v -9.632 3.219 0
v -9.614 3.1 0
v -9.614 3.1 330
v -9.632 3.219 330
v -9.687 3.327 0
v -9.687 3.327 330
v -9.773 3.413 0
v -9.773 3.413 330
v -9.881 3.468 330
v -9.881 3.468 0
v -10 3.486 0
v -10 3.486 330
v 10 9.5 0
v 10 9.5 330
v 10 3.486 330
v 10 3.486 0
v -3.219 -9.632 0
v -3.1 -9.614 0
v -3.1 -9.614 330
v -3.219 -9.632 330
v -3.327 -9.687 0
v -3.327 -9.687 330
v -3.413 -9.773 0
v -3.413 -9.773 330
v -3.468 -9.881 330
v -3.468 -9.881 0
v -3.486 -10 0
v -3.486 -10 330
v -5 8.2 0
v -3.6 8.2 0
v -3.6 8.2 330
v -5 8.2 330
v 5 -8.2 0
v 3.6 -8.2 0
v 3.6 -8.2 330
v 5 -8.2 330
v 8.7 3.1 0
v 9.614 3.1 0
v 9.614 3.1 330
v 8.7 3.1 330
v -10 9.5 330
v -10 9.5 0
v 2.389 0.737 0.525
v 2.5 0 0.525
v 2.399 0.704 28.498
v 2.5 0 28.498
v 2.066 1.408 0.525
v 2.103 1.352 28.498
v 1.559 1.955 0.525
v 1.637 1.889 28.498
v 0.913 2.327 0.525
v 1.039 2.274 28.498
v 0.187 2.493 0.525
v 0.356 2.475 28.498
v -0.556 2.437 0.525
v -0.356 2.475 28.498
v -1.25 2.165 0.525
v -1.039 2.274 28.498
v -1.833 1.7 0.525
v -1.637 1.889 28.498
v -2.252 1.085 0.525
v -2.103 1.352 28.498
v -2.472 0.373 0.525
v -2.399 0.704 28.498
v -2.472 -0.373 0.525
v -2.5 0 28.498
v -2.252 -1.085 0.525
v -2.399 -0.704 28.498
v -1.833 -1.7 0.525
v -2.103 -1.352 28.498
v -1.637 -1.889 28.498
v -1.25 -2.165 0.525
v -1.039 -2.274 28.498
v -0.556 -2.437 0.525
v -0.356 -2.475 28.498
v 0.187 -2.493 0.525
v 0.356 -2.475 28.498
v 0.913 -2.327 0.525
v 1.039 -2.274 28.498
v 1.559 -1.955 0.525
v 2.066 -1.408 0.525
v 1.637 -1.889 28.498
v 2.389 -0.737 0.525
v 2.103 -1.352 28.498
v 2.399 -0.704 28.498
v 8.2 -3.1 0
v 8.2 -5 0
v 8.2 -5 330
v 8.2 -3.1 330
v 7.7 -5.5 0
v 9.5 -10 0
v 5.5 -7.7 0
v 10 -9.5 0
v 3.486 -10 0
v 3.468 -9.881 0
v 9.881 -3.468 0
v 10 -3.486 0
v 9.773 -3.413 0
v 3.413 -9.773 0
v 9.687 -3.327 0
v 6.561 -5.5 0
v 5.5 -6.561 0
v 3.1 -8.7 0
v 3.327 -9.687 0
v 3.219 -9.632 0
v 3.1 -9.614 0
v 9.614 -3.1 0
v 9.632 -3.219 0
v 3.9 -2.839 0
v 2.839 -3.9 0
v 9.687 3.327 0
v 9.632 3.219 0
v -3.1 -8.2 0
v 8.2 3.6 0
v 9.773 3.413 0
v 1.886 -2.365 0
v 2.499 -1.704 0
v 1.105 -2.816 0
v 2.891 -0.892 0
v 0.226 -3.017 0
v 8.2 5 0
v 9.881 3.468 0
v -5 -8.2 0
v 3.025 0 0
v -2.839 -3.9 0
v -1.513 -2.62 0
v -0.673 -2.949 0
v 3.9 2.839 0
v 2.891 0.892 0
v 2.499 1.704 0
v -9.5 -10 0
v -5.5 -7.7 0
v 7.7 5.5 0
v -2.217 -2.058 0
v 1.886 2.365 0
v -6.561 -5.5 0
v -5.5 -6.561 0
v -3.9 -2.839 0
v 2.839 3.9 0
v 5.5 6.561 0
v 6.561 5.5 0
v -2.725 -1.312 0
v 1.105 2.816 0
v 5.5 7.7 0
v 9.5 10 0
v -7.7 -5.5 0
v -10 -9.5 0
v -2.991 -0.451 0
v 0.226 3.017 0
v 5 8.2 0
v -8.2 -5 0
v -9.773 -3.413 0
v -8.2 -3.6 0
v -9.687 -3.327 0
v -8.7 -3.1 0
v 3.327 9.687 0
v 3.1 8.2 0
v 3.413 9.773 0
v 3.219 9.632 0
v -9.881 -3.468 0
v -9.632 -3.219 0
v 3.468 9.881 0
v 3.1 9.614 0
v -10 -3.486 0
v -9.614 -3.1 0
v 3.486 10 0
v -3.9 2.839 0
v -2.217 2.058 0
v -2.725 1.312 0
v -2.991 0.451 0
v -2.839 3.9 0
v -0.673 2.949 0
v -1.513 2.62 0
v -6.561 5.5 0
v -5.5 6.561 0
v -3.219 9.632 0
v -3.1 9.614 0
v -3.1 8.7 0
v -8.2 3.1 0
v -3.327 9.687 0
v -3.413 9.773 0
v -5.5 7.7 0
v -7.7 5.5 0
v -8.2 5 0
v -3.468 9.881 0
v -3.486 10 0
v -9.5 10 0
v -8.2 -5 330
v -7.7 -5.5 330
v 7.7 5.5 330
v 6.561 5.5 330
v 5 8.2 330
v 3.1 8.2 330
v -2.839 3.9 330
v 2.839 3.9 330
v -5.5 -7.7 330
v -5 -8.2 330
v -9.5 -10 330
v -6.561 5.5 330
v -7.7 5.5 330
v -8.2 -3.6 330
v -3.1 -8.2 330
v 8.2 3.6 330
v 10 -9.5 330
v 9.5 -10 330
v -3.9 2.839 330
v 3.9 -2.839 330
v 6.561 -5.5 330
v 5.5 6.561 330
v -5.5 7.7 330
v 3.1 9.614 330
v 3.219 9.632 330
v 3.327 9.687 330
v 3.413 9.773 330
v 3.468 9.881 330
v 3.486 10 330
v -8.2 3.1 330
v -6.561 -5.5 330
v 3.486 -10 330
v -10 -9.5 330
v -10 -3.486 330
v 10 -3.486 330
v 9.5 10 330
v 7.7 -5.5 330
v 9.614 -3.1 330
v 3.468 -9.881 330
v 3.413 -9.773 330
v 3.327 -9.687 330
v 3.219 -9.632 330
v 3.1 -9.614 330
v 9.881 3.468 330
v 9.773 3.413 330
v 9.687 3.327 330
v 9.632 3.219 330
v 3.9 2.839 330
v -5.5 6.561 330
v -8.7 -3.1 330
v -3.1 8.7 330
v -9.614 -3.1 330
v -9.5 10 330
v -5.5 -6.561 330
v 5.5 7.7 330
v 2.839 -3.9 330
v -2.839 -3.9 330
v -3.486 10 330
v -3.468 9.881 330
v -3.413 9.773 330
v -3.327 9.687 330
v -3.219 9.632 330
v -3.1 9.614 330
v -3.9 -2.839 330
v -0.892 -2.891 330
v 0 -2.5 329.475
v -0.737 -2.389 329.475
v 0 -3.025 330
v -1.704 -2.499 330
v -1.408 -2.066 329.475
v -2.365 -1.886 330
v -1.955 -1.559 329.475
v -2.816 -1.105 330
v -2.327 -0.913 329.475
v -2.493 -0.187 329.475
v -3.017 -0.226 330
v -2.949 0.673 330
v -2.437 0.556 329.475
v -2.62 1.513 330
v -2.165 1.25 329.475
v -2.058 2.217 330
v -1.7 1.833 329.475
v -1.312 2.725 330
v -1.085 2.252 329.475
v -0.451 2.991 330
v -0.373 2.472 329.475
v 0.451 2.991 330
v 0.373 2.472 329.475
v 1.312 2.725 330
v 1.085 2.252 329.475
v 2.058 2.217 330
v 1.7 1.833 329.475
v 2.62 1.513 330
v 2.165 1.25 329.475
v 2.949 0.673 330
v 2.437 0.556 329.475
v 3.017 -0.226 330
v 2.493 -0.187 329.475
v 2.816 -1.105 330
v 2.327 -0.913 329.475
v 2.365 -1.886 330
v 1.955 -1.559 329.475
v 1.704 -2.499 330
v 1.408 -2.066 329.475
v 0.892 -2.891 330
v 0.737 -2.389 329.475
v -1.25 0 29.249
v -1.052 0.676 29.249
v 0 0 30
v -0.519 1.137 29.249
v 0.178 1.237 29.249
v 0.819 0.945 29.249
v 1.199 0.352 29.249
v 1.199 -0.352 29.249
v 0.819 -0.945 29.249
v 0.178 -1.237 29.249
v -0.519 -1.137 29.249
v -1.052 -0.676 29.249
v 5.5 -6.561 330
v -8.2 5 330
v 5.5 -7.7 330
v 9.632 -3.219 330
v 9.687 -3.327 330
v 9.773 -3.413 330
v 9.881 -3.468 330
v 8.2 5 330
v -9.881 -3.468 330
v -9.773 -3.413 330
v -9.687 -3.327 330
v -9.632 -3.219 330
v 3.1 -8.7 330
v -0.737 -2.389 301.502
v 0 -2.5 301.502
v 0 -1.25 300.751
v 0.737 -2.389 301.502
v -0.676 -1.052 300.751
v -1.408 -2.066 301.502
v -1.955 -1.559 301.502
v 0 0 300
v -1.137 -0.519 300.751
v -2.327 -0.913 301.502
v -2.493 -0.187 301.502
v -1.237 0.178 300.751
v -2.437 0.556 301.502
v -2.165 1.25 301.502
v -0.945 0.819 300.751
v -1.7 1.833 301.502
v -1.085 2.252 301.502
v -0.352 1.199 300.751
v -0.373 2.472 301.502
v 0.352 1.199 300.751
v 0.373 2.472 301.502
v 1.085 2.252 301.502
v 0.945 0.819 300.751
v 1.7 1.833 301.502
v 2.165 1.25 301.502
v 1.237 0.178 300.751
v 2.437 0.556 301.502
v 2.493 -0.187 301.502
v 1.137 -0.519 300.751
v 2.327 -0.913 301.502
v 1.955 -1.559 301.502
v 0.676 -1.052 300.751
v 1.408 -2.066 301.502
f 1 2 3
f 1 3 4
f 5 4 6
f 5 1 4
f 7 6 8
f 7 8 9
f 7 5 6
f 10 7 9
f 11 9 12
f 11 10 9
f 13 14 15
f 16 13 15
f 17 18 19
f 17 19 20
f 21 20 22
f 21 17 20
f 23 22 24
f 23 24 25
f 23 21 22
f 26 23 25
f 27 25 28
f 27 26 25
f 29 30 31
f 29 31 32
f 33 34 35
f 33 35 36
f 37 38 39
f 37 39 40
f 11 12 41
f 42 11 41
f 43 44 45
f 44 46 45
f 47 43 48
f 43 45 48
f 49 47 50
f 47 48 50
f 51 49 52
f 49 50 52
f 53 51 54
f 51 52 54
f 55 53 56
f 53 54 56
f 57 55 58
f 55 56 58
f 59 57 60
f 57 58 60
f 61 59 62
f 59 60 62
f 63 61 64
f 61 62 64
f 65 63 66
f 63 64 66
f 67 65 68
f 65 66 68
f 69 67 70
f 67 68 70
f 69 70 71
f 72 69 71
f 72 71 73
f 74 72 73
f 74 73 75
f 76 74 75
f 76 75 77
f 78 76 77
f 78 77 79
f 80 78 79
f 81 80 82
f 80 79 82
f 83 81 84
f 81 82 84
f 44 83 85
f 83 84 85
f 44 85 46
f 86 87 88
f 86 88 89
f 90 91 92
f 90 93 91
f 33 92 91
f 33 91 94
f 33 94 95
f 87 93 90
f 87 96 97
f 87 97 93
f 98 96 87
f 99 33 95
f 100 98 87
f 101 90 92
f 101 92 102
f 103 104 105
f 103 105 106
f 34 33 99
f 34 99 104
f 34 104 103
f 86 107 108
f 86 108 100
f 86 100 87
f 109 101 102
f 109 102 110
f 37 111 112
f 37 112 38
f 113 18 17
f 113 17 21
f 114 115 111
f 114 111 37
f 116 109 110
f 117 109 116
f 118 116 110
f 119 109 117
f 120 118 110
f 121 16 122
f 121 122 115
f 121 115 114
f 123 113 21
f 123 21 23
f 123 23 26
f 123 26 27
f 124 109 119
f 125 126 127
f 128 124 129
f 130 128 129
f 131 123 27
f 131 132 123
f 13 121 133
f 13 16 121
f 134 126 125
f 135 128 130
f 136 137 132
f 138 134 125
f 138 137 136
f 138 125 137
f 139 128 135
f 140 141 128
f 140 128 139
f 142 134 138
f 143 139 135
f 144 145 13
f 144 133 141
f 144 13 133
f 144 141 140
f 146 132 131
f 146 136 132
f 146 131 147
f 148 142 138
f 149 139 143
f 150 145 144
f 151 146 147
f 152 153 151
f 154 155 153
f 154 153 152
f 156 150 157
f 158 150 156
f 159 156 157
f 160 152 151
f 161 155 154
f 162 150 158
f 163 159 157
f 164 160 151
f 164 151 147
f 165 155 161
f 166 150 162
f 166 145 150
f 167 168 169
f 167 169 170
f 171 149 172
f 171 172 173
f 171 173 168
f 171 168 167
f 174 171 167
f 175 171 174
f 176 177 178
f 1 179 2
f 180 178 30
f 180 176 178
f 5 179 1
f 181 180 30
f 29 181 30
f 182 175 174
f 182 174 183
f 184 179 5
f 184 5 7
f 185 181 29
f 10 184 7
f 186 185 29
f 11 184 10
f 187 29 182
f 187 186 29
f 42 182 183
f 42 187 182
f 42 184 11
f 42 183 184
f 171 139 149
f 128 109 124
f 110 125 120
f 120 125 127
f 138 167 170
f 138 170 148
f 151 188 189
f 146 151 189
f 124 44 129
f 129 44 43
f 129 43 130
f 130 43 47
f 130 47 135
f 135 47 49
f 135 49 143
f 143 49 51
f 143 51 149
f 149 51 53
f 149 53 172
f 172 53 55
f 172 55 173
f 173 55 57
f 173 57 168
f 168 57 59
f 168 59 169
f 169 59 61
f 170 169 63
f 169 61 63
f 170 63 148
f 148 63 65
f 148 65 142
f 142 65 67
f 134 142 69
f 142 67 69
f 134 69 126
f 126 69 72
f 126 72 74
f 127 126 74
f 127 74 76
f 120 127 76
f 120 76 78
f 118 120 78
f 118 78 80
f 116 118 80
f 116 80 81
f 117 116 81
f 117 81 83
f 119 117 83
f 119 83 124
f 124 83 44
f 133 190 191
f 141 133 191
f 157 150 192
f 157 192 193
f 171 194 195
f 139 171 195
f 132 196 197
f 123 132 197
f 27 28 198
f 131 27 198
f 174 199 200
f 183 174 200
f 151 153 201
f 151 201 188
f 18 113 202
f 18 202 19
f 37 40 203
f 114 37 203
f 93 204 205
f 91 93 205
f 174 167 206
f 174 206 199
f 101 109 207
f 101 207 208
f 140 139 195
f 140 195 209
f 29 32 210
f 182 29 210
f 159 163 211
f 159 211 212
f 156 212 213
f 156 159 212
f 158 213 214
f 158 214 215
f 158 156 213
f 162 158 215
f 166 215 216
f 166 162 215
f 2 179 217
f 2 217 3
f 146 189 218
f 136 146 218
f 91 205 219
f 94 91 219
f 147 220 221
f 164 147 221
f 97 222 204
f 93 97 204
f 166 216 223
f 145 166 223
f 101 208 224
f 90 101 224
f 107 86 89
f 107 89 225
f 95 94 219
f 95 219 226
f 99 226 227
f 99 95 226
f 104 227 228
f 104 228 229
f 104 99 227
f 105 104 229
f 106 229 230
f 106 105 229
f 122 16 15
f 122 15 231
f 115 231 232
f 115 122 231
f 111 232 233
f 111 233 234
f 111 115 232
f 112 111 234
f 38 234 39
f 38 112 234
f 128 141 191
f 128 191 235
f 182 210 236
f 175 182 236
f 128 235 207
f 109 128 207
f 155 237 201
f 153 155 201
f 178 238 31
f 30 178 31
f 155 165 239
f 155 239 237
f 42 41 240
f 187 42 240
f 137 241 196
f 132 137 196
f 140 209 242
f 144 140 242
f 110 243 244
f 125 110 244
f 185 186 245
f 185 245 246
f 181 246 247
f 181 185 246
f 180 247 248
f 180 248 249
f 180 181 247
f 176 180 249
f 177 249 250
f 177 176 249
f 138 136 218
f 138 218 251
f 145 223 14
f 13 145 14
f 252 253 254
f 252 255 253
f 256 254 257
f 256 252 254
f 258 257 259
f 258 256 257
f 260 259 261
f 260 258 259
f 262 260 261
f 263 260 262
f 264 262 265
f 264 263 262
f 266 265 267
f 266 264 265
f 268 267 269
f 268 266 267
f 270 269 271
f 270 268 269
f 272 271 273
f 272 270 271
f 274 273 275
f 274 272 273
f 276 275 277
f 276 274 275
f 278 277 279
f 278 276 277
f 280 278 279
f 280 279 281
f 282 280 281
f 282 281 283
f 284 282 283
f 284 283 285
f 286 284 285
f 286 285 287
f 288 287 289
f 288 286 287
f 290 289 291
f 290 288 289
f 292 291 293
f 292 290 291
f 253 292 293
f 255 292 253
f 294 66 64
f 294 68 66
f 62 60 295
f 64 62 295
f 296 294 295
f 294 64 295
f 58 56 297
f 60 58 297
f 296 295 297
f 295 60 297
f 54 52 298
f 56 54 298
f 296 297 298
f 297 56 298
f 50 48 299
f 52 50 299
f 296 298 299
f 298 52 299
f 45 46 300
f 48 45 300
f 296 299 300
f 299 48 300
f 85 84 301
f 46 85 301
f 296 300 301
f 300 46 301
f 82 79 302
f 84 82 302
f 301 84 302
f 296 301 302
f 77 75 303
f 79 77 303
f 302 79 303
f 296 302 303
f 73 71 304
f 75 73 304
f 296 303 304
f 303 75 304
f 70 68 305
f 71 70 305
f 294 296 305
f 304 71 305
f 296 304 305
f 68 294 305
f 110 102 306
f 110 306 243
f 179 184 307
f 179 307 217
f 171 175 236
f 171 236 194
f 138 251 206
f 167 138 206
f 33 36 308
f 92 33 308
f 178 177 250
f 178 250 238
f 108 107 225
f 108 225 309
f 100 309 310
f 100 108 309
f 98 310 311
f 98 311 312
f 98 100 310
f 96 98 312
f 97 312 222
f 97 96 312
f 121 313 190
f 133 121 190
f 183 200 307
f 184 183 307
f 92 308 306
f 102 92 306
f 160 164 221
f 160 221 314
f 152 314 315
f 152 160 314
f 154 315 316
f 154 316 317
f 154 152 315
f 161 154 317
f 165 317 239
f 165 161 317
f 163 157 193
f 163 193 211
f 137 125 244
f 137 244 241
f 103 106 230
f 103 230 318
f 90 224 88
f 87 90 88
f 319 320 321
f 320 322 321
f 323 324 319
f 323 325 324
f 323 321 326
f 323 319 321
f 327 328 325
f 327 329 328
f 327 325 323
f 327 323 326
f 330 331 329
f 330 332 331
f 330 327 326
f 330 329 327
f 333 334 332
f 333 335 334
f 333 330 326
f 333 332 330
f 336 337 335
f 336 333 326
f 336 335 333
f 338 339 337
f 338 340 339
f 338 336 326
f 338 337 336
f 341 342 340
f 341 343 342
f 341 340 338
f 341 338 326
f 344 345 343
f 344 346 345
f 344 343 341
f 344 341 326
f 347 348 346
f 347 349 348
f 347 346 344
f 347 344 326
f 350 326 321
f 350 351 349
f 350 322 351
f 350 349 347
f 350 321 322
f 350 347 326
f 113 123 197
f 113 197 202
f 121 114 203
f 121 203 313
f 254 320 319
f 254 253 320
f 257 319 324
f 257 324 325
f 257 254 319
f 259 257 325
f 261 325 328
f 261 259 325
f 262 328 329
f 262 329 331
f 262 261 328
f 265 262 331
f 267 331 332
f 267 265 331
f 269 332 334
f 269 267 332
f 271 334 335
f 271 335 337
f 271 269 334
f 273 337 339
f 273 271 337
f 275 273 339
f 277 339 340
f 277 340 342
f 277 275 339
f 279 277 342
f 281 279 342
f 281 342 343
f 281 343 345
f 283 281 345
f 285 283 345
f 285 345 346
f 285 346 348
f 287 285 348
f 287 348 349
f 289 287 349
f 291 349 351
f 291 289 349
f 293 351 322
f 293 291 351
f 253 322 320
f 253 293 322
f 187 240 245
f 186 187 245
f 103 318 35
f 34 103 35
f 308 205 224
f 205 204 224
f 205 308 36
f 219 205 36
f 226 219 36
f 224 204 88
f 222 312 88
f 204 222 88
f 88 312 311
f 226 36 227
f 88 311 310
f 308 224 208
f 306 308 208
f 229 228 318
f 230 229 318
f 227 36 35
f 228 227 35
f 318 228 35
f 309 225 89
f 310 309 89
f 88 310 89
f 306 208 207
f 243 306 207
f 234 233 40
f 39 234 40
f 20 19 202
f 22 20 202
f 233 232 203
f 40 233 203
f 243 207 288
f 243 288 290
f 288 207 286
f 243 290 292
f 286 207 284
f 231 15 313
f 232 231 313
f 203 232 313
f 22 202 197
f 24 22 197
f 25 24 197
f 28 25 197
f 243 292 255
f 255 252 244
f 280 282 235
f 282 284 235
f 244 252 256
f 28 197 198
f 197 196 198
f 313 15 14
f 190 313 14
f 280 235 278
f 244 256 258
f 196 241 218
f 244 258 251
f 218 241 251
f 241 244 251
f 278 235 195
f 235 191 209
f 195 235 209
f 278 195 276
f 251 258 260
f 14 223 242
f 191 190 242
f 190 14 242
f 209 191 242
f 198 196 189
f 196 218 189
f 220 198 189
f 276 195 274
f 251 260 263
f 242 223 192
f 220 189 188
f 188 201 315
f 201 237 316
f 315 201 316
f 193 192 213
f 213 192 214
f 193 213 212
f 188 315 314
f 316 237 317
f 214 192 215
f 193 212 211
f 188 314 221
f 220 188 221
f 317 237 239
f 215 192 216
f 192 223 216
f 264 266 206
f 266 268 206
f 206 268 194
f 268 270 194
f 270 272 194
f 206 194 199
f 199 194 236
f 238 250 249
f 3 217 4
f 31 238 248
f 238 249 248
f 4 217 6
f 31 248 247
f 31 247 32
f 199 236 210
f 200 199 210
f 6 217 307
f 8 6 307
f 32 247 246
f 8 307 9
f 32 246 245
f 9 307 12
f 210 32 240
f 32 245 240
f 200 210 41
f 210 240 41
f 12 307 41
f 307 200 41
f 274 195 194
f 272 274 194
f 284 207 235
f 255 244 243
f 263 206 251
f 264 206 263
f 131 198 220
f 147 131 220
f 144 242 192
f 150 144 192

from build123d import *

# Parameters (mm, degrees)
BOSS_EXTRUDE1_DEPTH             = 330
M6X1_0_TAPPED_HOLE2_D           = 5
M6X1_0_TAPPED_HOLE2_DEPTH       = 28.497848452
M6X1_0_TAPPED_HOLE2_CSINK_D     = 6.05
M6X1_0_TAPPED_HOLE2_CSINK_ANGLE = 90
M6X1_0_TAPPED_HOLE2_TIP         = 1.502151548


with BuildPart() as part:
    # Sketch1 → Boss-Extrude1 (new body)
    with BuildSketch(Plane.XY):
        with BuildLine():
            Line((-9.5, 10), (-3.486470896, 10))
            ThreePointArc((-3.486470896, 10), (-3.373276191, 9.726723809), (-3.1, 9.613529104))
            Line((-3.1, 9.613529104), (-3.1, 8.7))
            Line((-3.1, 8.7), (-3.6, 8.2))
            Line((-3.6, 8.2), (-5, 8.2))
            Line((-5, 8.2), (-5.5, 7.7))
            Line((-5.5, 7.7), (-5.5, 6.560660172))
            Line((-5.5, 6.560660172), (-2.839339828, 3.9))
            Line((-2.839339828, 3.9), (0, 3.9))
            Line((0, 3.9), (2.839339828, 3.9))
            Line((2.839339828, 3.9), (5.5, 6.560660172))
            Line((5.5, 6.560660172), (5.5, 7.7))
            Line((5.5, 7.7), (5, 8.2))
            Line((5, 8.2), (3.1, 8.2))
            Line((3.1, 8.2), (3.1, 9.613529104))
            ThreePointArc((3.1, 9.613529104), (3.373276191, 9.726723809), (3.486470896, 10))
            Line((3.486470896, 10), (9.5, 10))
            Line((9.5, 10), (10, 9.5))
            Line((10, 9.5), (10, 3.486470896))
            ThreePointArc((10, 3.486470896), (9.726723809, 3.373276191), (9.613529104, 3.1))
            Line((9.613529104, 3.1), (8.7, 3.1))
            Line((8.7, 3.1), (8.2, 3.6))
            Line((8.2, 3.6), (8.2, 5))
            Line((8.2, 5), (7.7, 5.5))
            Line((7.7, 5.5), (6.560660172, 5.5))
            Line((6.560660172, 5.5), (3.9, 2.839339828))
            Line((3.9, 2.839339828), (3.9, 0))
            Line((3.9, 0), (3.9, -2.839339828))
            Line((3.9, -2.839339828), (6.560660172, -5.5))
            Line((6.560660172, -5.5), (7.7, -5.5))
            Line((7.7, -5.5), (8.2, -5))
            Line((8.2, -5), (8.2, -3.1))
            Line((8.2, -3.1), (9.613529104, -3.1))
            ThreePointArc((9.613529104, -3.1), (9.726723809, -3.373276191), (10, -3.486470896))
            Line((10, -3.486470896), (10, -9.5))
            Line((10, -9.5), (9.5, -10))
            Line((9.5, -10), (3.486470896, -10))
            ThreePointArc((3.486470896, -10), (3.373276191, -9.726723809), (3.1, -9.613529104))
            Line((3.1, -9.613529104), (3.1, -8.7))
            Line((3.1, -8.7), (3.6, -8.2))
            Line((3.6, -8.2), (5, -8.2))
            Line((5, -8.2), (5.5, -7.7))
            Line((5.5, -7.7), (5.5, -6.560660172))
            Line((5.5, -6.560660172), (2.839339828, -3.9))
            Line((2.839339828, -3.9), (0, -3.9))
            Line((0, -3.9), (-2.839339828, -3.9))
            Line((-2.839339828, -3.9), (-5.5, -6.560660172))
            Line((-5.5, -6.560660172), (-5.5, -7.7))
            Line((-5.5, -7.7), (-5, -8.2))
            Line((-5, -8.2), (-3.1, -8.2))
            Line((-3.1, -8.2), (-3.1, -9.613529104))
            ThreePointArc((-3.1, -9.613529104), (-3.373276191, -9.726723809), (-3.486470896, -10))
            Line((-3.486470896, -10), (-9.5, -10))
            Line((-9.5, -10), (-10, -9.5))
            Line((-10, -9.5), (-10, -3.486470896))
            ThreePointArc((-10, -3.486470896), (-9.726723809, -3.373276191), (-9.613529104, -3.1))
            Line((-9.613529104, -3.1), (-8.7, -3.1))
            Line((-8.7, -3.1), (-8.2, -3.6))
            Line((-8.2, -3.6), (-8.2, -5))
            Line((-8.2, -5), (-7.7, -5.5))
            Line((-7.7, -5.5), (-6.560660172, -5.5))
            Line((-6.560660172, -5.5), (-3.9, -2.839339828))
            Line((-3.9, -2.839339828), (-3.9, 0))
            Line((-3.9, 0), (-3.9, 2.839339828))
            Line((-3.9, 2.839339828), (-6.560660172, 5.5))
            Line((-6.560660172, 5.5), (-7.7, 5.5))
            Line((-7.7, 5.5), (-8.2, 5))
            Line((-8.2, 5), (-8.2, 3.1))
            Line((-8.2, 3.1), (-9.613529104, 3.1))
            ThreePointArc((-9.613529104, 3.1), (-9.726723809, 3.373276191), (-10, 3.486470896))
            Line((-10, 3.486470896), (-10, 9.5))
            Line((-10, 9.5), (-9.5, 10))
        make_face()
    extrude(amount=BOSS_EXTRUDE1_DEPTH)

    # Sketch2 → M6x1.0 Tapped Hole1 (revolve, cut)
    with BuildSketch(Plane(origin=(0, 0, 330), x_dir=(0, -1, 0), z_dir=(1, 0, 0))):
        Polygon((0, 0), (0, 30), (2.5, 28.497848452), (2.5, 0.525), (3.025, 0), align=None)
    revolve(axis=Axis((0, 0, 336.35), (0, 0, -1)), mode=Mode.SUBTRACT)

    # M6x1.0 Tapped Hole2
    with Locations(Plane(origin=(0, 0, 0), x_dir=(-1, 0, 0), z_dir=(0, 0, -1))):
        with Locations((0, 0)):
            CounterSinkHole(M6X1_0_TAPPED_HOLE2_D / 2, M6X1_0_TAPPED_HOLE2_CSINK_D / 2, depth=M6X1_0_TAPPED_HOLE2_DEPTH, counter_sink_angle=M6X1_0_TAPPED_HOLE2_CSINK_ANGLE)
            with Locations((0, 0, -(M6X1_0_TAPPED_HOLE2_DEPTH + M6X1_0_TAPPED_HOLE2_TIP / 2))):  # 118° drill point
                Cone(0, M6X1_0_TAPPED_HOLE2_D / 2, M6X1_0_TAPPED_HOLE2_TIP, mode=Mode.SUBTRACT)


solid = part.part
